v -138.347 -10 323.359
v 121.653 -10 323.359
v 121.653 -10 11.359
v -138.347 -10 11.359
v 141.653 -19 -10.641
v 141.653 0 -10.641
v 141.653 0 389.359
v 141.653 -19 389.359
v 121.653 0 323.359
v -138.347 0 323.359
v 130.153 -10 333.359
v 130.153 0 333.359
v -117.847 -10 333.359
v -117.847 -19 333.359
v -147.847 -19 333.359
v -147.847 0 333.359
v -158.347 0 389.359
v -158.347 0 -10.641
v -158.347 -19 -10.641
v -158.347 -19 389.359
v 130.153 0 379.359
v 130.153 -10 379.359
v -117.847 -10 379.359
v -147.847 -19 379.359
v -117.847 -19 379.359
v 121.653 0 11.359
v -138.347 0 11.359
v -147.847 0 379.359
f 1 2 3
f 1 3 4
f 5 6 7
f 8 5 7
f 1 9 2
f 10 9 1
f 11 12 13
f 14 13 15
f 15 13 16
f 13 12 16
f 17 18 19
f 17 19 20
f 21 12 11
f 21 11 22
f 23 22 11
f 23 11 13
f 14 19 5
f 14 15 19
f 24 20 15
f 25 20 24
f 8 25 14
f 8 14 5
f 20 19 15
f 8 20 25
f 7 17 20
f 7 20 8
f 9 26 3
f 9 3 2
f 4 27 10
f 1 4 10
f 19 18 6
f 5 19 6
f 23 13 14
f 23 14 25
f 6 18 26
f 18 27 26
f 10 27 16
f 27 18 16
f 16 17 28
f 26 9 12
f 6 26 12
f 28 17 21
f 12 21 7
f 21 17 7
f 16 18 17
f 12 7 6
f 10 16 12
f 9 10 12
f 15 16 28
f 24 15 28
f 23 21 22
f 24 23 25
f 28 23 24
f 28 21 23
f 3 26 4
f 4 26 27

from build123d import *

# Parameters (mm, degrees)
F0_W     = 300
F0_H     = 400
F1_DEPTH = 19
F2_W     = 278
F2_H     = 46
F3_DEPTH = 10
F4_W     = 30
F4_H     = 46
F5_DEPTH = 10
F6_W     = 260
F6_H     = 312
F7_DEPTH = 10


with BuildPart() as f1:
    # F0 (on Front) → F1 (new body)
    with BuildSketch(Plane.XZ):
        with Locations((-8.346558, 189.359199)):
            Rectangle(F0_W, F0_H)
    extrude(amount=F1_DEPTH)

    # F2 (on face) → F3 (cut)
    with BuildSketch(Plane(origin=(0, 0, 0), x_dir=(-1, 0, 0), z_dir=(0, 1, 0))):
        with Locations((8.846558, 356.359199)):
            Rectangle(F2_W, F2_H)
    extrude(amount=-F3_DEPTH, mode=Mode.SUBTRACT)

    # F4 (on face) → F5 (cut)
    with BuildSketch(Plane(origin=(0, -10, 0), x_dir=(-1, 0, 0), z_dir=(0, 1, 0))):
        with Locations((132.846558, 356.359199)):
            Rectangle(F4_W, F4_H)
    extrude(amount=-F5_DEPTH, mode=Mode.SUBTRACT)

    # F6 (on face) → F7 (cut)
    with BuildSketch(Plane(origin=(0, 0, 0), x_dir=(-1, 0, 0), z_dir=(0, 1, 0))):
        with Locations((8.346558, 167.359199)):
            Rectangle(F6_W, F6_H)
    extrude(amount=-F7_DEPTH, mode=Mode.SUBTRACT)


solid = f1.part
